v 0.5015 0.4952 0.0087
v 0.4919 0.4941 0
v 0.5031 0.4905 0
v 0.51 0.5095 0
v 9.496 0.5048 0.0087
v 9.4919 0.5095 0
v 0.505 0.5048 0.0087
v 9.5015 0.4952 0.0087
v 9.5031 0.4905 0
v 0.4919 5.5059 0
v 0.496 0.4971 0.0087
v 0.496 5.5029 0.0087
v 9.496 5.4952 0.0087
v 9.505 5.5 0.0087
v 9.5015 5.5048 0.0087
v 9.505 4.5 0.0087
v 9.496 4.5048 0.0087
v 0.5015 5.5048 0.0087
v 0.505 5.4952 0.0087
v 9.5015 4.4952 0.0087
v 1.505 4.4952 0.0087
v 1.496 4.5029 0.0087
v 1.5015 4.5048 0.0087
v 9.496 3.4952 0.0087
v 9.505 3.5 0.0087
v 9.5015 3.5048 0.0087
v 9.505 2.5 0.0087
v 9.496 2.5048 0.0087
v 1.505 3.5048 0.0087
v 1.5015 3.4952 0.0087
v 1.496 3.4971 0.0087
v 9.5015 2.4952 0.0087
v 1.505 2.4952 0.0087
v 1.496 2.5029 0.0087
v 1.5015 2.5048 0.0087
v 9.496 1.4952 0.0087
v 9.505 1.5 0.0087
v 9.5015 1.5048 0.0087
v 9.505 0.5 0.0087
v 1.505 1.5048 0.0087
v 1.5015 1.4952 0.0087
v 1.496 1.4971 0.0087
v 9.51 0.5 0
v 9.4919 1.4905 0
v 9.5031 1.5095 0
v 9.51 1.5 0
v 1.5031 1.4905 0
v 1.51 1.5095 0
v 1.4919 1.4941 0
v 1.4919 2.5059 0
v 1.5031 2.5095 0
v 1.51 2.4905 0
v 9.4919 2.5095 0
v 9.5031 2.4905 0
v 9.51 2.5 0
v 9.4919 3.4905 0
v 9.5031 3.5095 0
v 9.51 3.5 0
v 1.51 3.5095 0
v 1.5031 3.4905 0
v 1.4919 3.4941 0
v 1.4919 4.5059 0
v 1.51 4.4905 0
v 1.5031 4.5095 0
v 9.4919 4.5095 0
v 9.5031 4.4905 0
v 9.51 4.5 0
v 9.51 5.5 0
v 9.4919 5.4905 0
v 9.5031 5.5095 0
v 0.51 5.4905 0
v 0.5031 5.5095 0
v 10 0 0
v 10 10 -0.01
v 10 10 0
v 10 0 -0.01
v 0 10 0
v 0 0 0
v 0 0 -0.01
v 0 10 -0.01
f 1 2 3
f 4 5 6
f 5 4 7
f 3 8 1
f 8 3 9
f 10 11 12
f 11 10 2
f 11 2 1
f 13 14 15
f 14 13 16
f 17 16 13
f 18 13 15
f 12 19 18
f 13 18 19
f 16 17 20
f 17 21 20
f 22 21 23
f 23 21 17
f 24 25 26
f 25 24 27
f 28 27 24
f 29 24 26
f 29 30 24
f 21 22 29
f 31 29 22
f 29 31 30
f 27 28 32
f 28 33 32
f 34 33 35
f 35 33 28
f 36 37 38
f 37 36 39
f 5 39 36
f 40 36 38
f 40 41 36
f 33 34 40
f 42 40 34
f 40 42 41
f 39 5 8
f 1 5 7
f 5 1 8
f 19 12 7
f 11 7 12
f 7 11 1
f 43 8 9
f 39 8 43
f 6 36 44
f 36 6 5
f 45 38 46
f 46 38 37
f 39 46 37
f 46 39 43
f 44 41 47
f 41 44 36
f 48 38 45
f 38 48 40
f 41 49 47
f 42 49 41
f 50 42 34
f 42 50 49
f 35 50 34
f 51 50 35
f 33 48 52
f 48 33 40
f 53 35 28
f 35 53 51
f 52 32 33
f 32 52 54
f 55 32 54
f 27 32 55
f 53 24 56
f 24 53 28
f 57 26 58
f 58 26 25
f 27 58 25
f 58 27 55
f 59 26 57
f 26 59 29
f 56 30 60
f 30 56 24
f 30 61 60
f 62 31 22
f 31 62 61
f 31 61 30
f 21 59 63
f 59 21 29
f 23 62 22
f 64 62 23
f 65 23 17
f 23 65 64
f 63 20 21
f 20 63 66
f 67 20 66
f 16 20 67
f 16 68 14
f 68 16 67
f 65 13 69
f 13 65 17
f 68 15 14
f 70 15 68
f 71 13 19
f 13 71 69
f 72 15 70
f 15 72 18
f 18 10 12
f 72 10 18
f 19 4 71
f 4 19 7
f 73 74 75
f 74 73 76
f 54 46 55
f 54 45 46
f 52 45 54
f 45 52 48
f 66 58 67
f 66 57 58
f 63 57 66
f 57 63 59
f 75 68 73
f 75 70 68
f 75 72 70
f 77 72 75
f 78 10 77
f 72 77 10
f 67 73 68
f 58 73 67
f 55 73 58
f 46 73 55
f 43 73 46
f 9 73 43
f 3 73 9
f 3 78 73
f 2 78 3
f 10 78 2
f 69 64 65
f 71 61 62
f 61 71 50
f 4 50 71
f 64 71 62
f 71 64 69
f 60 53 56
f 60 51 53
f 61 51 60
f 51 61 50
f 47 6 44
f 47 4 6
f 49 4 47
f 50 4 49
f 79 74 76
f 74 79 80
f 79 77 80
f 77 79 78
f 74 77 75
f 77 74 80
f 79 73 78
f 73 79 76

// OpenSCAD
hull(){
    translate([0.5, 0.5]) sphere(0.01);
    translate([1.5, 0.5]) sphere(0.01);
}
hull(){
    translate([1.5, 0.5]) sphere(0.01);
    translate([2.5, 0.5]) sphere(0.01);
}
hull(){
    translate([2.5, 0.5]) sphere(0.01);
    translate([3.5, 0.5]) sphere(0.01);
}
hull(){
    translate([3.5, 0.5]) sphere(0.01);
    translate([4.5, 0.5]) sphere(0.01);
}
hull(){
    translate([4.5, 0.5]) sphere(0.01);
    translate([5.5, 0.5]) sphere(0.01);
}
hull(){
    translate([5.5, 0.5]) sphere(0.01);
    translate([6.5, 0.5]) sphere(0.01);
}
hull(){
    translate([6.5, 0.5]) sphere(0.01);
    translate([7.5, 0.5]) sphere(0.01);
}
hull(){
    translate([7.5, 0.5]) sphere(0.01);
    translate([8.5, 0.5]) sphere(0.01);
}
hull(){
    translate([8.5, 0.5]) sphere(0.01);
    translate([9.5, 0.5]) sphere(0.01);
}
hull(){
    translate([9.5, 0.5]) sphere(0.01);
    translate([9.5, 1.5]) sphere(0.01);
}
hull(){
    translate([9.5, 1.5]) sphere(0.01);
    translate([8.5, 1.5]) sphere(0.01);
}
hull(){
    translate([8.5, 1.5]) sphere(0.01);
    translate([7.5, 1.5]) sphere(0.01);
}
hull(){
    translate([7.5, 1.5]) sphere(0.01);
    translate([6.5, 1.5]) sphere(0.01);
}
hull(){
    translate([6.5, 1.5]) sphere(0.01);
    translate([5.5, 1.5]) sphere(0.01);
}
hull(){
    translate([5.5, 1.5]) sphere(0.01);
    translate([4.5, 1.5]) sphere(0.01);
}
hull(){
    translate([4.5, 1.5]) sphere(0.01);
    translate([3.5, 1.5]) sphere(0.01);
}
hull(){
    translate([3.5, 1.5]) sphere(0.01);
    translate([2.5, 1.5]) sphere(0.01);
}
hull(){
    translate([2.5, 1.5]) sphere(0.01);
    translate([1.5, 1.5]) sphere(0.01);
}
hull(){
    translate([1.5, 1.5]) sphere(0.01);
    translate([1.5, 2.5]) sphere(0.01);
}
hull(){
    translate([1.5, 2.5]) sphere(0.01);
    translate([2.5, 2.5]) sphere(0.01);
}
hull(){
    translate([2.5, 2.5]) sphere(0.01);
    translate([3.5, 2.5]) sphere(0.01);
}
hull(){
    translate([3.5, 2.5]) sphere(0.01);
    translate([4.5, 2.5]) sphere(0.01);
}
hull(){
    translate([4.5, 2.5]) sphere(0.01);
    translate([5.5, 2.5]) sphere(0.01);
}
hull(){
    translate([5.5, 2.5]) sphere(0.01);
    translate([6.5, 2.5]) sphere(0.01);
}
hull(){
    translate([6.5, 2.5]) sphere(0.01);
    translate([7.5, 2.5]) sphere(0.01);
}
hull(){
    translate([7.5, 2.5]) sphere(0.01);
    translate([8.5, 2.5]) sphere(0.01);
}
hull(){
    translate([8.5, 2.5]) sphere(0.01);
    translate([9.5, 2.5]) sphere(0.01);
}
hull(){
    translate([9.5, 2.5]) sphere(0.01);
    translate([9.5, 3.5]) sphere(0.01);
}
hull(){
    translate([9.5, 3.5]) sphere(0.01);
    translate([8.5, 3.5]) sphere(0.01);
}
hull(){
    translate([8.5, 3.5]) sphere(0.01);
    translate([7.5, 3.5]) sphere(0.01);
}
hull(){
    translate([7.5, 3.5]) sphere(0.01);
    translate([6.5, 3.5]) sphere(0.01);
}
hull(){
    translate([6.5, 3.5]) sphere(0.01);
    translate([5.5, 3.5]) sphere(0.01);
}
hull(){
    translate([5.5, 3.5]) sphere(0.01);
    translate([4.5, 3.5]) sphere(0.01);
}
hull(){
    translate([4.5, 3.5]) sphere(0.01);
    translate([3.5, 3.5]) sphere(0.01);
}
hull(){
    translate([3.5, 3.5]) sphere(0.01);
    translate([2.5, 3.5]) sphere(0.01);
}
hull(){
    translate([2.5, 3.5]) sphere(0.01);
    translate([1.5, 3.5]) sphere(0.01);
}
hull(){
    translate([1.5, 3.5]) sphere(0.01);
    translate([1.5, 4.5]) sphere(0.01);
}
hull(){
    translate([1.5, 4.5]) sphere(0.01);
    translate([2.5, 4.5]) sphere(0.01);
}
hull(){
    translate([2.5, 4.5]) sphere(0.01);
    translate([3.5, 4.5]) sphere(0.01);
}
hull(){
    translate([3.5, 4.5]) sphere(0.01);
    translate([4.5, 4.5]) sphere(0.01);
}
hull(){
    translate([4.5, 4.5]) sphere(0.01);
    translate([5.5, 4.5]) sphere(0.01);
}
hull(){
    translate([5.5, 4.5]) sphere(0.01);
    translate([6.5, 4.5]) sphere(0.01);
}
hull(){
    translate([6.5, 4.5]) sphere(0.01);
    translate([7.5, 4.5]) sphere(0.01);
}
hull(){
    translate([7.5, 4.5]) sphere(0.01);
    translate([8.5, 4.5]) sphere(0.01);
}
hull(){
    translate([8.5, 4.5]) sphere(0.01);
    translate([9.5, 4.5]) sphere(0.01);
}
hull(){
    translate([9.5, 4.5]) sphere(0.01);
    translate([9.5, 5.5]) sphere(0.01);
}
hull(){
    translate([9.5, 5.5]) sphere(0.01);
    translate([8.5, 5.5]) sphere(0.01);
}
hull(){
    translate([8.5, 5.5]) sphere(0.01);
    translate([7.5, 5.5]) sphere(0.01);
}
hull(){
    translate([7.5, 5.5]) sphere(0.01);
    translate([6.5, 5.5]) sphere(0.01);
}
hull(){
    translate([6.5, 5.5]) sphere(0.01);
    translate([5.5, 5.5]) sphere(0.01);
}
hull(){
    translate([5.5, 5.5]) sphere(0.01);
    translate([4.5, 5.5]) sphere(0.01);
}
hull(){
    translate([4.5, 5.5]) sphere(0.01);
    translate([3.5, 5.5]) sphere(0.01);
}
hull(){
    translate([3.5, 5.5]) sphere(0.01);
    translate([2.5, 5.5]) sphere(0.01);
}
hull(){
    translate([2.5, 5.5]) sphere(0.01);
    translate([1.5, 5.5]) sphere(0.01);
}
hull(){
    translate([1.5, 5.5]) sphere(0.01);
    translate([0.5, 5.5]) sphere(0.01);
}
hull(){
    translate([0.5, 5.5]) sphere(0.01);
    translate([0.5, 4.5]) sphere(0.01);
}
hull(){
    translate([0.5, 4.5]) sphere(0.01);
    translate([0.5, 3.5]) sphere(0.01);
}
hull(){
    translate([0.5, 3.5]) sphere(0.01);
    translate([0.5, 2.5]) sphere(0.01);
}
hull(){
    translate([0.5, 2.5]) sphere(0.01);
    translate([0.5, 1.5]) sphere(0.01);
}
hull(){
    translate([0.5, 1.5]) sphere(0.01);
    translate([0.5, 0.5]) sphere(0.01);
}
translate([0,0,-0.01]) color([0.1,0.1,0.1]) cube([10,10,0.01]);
